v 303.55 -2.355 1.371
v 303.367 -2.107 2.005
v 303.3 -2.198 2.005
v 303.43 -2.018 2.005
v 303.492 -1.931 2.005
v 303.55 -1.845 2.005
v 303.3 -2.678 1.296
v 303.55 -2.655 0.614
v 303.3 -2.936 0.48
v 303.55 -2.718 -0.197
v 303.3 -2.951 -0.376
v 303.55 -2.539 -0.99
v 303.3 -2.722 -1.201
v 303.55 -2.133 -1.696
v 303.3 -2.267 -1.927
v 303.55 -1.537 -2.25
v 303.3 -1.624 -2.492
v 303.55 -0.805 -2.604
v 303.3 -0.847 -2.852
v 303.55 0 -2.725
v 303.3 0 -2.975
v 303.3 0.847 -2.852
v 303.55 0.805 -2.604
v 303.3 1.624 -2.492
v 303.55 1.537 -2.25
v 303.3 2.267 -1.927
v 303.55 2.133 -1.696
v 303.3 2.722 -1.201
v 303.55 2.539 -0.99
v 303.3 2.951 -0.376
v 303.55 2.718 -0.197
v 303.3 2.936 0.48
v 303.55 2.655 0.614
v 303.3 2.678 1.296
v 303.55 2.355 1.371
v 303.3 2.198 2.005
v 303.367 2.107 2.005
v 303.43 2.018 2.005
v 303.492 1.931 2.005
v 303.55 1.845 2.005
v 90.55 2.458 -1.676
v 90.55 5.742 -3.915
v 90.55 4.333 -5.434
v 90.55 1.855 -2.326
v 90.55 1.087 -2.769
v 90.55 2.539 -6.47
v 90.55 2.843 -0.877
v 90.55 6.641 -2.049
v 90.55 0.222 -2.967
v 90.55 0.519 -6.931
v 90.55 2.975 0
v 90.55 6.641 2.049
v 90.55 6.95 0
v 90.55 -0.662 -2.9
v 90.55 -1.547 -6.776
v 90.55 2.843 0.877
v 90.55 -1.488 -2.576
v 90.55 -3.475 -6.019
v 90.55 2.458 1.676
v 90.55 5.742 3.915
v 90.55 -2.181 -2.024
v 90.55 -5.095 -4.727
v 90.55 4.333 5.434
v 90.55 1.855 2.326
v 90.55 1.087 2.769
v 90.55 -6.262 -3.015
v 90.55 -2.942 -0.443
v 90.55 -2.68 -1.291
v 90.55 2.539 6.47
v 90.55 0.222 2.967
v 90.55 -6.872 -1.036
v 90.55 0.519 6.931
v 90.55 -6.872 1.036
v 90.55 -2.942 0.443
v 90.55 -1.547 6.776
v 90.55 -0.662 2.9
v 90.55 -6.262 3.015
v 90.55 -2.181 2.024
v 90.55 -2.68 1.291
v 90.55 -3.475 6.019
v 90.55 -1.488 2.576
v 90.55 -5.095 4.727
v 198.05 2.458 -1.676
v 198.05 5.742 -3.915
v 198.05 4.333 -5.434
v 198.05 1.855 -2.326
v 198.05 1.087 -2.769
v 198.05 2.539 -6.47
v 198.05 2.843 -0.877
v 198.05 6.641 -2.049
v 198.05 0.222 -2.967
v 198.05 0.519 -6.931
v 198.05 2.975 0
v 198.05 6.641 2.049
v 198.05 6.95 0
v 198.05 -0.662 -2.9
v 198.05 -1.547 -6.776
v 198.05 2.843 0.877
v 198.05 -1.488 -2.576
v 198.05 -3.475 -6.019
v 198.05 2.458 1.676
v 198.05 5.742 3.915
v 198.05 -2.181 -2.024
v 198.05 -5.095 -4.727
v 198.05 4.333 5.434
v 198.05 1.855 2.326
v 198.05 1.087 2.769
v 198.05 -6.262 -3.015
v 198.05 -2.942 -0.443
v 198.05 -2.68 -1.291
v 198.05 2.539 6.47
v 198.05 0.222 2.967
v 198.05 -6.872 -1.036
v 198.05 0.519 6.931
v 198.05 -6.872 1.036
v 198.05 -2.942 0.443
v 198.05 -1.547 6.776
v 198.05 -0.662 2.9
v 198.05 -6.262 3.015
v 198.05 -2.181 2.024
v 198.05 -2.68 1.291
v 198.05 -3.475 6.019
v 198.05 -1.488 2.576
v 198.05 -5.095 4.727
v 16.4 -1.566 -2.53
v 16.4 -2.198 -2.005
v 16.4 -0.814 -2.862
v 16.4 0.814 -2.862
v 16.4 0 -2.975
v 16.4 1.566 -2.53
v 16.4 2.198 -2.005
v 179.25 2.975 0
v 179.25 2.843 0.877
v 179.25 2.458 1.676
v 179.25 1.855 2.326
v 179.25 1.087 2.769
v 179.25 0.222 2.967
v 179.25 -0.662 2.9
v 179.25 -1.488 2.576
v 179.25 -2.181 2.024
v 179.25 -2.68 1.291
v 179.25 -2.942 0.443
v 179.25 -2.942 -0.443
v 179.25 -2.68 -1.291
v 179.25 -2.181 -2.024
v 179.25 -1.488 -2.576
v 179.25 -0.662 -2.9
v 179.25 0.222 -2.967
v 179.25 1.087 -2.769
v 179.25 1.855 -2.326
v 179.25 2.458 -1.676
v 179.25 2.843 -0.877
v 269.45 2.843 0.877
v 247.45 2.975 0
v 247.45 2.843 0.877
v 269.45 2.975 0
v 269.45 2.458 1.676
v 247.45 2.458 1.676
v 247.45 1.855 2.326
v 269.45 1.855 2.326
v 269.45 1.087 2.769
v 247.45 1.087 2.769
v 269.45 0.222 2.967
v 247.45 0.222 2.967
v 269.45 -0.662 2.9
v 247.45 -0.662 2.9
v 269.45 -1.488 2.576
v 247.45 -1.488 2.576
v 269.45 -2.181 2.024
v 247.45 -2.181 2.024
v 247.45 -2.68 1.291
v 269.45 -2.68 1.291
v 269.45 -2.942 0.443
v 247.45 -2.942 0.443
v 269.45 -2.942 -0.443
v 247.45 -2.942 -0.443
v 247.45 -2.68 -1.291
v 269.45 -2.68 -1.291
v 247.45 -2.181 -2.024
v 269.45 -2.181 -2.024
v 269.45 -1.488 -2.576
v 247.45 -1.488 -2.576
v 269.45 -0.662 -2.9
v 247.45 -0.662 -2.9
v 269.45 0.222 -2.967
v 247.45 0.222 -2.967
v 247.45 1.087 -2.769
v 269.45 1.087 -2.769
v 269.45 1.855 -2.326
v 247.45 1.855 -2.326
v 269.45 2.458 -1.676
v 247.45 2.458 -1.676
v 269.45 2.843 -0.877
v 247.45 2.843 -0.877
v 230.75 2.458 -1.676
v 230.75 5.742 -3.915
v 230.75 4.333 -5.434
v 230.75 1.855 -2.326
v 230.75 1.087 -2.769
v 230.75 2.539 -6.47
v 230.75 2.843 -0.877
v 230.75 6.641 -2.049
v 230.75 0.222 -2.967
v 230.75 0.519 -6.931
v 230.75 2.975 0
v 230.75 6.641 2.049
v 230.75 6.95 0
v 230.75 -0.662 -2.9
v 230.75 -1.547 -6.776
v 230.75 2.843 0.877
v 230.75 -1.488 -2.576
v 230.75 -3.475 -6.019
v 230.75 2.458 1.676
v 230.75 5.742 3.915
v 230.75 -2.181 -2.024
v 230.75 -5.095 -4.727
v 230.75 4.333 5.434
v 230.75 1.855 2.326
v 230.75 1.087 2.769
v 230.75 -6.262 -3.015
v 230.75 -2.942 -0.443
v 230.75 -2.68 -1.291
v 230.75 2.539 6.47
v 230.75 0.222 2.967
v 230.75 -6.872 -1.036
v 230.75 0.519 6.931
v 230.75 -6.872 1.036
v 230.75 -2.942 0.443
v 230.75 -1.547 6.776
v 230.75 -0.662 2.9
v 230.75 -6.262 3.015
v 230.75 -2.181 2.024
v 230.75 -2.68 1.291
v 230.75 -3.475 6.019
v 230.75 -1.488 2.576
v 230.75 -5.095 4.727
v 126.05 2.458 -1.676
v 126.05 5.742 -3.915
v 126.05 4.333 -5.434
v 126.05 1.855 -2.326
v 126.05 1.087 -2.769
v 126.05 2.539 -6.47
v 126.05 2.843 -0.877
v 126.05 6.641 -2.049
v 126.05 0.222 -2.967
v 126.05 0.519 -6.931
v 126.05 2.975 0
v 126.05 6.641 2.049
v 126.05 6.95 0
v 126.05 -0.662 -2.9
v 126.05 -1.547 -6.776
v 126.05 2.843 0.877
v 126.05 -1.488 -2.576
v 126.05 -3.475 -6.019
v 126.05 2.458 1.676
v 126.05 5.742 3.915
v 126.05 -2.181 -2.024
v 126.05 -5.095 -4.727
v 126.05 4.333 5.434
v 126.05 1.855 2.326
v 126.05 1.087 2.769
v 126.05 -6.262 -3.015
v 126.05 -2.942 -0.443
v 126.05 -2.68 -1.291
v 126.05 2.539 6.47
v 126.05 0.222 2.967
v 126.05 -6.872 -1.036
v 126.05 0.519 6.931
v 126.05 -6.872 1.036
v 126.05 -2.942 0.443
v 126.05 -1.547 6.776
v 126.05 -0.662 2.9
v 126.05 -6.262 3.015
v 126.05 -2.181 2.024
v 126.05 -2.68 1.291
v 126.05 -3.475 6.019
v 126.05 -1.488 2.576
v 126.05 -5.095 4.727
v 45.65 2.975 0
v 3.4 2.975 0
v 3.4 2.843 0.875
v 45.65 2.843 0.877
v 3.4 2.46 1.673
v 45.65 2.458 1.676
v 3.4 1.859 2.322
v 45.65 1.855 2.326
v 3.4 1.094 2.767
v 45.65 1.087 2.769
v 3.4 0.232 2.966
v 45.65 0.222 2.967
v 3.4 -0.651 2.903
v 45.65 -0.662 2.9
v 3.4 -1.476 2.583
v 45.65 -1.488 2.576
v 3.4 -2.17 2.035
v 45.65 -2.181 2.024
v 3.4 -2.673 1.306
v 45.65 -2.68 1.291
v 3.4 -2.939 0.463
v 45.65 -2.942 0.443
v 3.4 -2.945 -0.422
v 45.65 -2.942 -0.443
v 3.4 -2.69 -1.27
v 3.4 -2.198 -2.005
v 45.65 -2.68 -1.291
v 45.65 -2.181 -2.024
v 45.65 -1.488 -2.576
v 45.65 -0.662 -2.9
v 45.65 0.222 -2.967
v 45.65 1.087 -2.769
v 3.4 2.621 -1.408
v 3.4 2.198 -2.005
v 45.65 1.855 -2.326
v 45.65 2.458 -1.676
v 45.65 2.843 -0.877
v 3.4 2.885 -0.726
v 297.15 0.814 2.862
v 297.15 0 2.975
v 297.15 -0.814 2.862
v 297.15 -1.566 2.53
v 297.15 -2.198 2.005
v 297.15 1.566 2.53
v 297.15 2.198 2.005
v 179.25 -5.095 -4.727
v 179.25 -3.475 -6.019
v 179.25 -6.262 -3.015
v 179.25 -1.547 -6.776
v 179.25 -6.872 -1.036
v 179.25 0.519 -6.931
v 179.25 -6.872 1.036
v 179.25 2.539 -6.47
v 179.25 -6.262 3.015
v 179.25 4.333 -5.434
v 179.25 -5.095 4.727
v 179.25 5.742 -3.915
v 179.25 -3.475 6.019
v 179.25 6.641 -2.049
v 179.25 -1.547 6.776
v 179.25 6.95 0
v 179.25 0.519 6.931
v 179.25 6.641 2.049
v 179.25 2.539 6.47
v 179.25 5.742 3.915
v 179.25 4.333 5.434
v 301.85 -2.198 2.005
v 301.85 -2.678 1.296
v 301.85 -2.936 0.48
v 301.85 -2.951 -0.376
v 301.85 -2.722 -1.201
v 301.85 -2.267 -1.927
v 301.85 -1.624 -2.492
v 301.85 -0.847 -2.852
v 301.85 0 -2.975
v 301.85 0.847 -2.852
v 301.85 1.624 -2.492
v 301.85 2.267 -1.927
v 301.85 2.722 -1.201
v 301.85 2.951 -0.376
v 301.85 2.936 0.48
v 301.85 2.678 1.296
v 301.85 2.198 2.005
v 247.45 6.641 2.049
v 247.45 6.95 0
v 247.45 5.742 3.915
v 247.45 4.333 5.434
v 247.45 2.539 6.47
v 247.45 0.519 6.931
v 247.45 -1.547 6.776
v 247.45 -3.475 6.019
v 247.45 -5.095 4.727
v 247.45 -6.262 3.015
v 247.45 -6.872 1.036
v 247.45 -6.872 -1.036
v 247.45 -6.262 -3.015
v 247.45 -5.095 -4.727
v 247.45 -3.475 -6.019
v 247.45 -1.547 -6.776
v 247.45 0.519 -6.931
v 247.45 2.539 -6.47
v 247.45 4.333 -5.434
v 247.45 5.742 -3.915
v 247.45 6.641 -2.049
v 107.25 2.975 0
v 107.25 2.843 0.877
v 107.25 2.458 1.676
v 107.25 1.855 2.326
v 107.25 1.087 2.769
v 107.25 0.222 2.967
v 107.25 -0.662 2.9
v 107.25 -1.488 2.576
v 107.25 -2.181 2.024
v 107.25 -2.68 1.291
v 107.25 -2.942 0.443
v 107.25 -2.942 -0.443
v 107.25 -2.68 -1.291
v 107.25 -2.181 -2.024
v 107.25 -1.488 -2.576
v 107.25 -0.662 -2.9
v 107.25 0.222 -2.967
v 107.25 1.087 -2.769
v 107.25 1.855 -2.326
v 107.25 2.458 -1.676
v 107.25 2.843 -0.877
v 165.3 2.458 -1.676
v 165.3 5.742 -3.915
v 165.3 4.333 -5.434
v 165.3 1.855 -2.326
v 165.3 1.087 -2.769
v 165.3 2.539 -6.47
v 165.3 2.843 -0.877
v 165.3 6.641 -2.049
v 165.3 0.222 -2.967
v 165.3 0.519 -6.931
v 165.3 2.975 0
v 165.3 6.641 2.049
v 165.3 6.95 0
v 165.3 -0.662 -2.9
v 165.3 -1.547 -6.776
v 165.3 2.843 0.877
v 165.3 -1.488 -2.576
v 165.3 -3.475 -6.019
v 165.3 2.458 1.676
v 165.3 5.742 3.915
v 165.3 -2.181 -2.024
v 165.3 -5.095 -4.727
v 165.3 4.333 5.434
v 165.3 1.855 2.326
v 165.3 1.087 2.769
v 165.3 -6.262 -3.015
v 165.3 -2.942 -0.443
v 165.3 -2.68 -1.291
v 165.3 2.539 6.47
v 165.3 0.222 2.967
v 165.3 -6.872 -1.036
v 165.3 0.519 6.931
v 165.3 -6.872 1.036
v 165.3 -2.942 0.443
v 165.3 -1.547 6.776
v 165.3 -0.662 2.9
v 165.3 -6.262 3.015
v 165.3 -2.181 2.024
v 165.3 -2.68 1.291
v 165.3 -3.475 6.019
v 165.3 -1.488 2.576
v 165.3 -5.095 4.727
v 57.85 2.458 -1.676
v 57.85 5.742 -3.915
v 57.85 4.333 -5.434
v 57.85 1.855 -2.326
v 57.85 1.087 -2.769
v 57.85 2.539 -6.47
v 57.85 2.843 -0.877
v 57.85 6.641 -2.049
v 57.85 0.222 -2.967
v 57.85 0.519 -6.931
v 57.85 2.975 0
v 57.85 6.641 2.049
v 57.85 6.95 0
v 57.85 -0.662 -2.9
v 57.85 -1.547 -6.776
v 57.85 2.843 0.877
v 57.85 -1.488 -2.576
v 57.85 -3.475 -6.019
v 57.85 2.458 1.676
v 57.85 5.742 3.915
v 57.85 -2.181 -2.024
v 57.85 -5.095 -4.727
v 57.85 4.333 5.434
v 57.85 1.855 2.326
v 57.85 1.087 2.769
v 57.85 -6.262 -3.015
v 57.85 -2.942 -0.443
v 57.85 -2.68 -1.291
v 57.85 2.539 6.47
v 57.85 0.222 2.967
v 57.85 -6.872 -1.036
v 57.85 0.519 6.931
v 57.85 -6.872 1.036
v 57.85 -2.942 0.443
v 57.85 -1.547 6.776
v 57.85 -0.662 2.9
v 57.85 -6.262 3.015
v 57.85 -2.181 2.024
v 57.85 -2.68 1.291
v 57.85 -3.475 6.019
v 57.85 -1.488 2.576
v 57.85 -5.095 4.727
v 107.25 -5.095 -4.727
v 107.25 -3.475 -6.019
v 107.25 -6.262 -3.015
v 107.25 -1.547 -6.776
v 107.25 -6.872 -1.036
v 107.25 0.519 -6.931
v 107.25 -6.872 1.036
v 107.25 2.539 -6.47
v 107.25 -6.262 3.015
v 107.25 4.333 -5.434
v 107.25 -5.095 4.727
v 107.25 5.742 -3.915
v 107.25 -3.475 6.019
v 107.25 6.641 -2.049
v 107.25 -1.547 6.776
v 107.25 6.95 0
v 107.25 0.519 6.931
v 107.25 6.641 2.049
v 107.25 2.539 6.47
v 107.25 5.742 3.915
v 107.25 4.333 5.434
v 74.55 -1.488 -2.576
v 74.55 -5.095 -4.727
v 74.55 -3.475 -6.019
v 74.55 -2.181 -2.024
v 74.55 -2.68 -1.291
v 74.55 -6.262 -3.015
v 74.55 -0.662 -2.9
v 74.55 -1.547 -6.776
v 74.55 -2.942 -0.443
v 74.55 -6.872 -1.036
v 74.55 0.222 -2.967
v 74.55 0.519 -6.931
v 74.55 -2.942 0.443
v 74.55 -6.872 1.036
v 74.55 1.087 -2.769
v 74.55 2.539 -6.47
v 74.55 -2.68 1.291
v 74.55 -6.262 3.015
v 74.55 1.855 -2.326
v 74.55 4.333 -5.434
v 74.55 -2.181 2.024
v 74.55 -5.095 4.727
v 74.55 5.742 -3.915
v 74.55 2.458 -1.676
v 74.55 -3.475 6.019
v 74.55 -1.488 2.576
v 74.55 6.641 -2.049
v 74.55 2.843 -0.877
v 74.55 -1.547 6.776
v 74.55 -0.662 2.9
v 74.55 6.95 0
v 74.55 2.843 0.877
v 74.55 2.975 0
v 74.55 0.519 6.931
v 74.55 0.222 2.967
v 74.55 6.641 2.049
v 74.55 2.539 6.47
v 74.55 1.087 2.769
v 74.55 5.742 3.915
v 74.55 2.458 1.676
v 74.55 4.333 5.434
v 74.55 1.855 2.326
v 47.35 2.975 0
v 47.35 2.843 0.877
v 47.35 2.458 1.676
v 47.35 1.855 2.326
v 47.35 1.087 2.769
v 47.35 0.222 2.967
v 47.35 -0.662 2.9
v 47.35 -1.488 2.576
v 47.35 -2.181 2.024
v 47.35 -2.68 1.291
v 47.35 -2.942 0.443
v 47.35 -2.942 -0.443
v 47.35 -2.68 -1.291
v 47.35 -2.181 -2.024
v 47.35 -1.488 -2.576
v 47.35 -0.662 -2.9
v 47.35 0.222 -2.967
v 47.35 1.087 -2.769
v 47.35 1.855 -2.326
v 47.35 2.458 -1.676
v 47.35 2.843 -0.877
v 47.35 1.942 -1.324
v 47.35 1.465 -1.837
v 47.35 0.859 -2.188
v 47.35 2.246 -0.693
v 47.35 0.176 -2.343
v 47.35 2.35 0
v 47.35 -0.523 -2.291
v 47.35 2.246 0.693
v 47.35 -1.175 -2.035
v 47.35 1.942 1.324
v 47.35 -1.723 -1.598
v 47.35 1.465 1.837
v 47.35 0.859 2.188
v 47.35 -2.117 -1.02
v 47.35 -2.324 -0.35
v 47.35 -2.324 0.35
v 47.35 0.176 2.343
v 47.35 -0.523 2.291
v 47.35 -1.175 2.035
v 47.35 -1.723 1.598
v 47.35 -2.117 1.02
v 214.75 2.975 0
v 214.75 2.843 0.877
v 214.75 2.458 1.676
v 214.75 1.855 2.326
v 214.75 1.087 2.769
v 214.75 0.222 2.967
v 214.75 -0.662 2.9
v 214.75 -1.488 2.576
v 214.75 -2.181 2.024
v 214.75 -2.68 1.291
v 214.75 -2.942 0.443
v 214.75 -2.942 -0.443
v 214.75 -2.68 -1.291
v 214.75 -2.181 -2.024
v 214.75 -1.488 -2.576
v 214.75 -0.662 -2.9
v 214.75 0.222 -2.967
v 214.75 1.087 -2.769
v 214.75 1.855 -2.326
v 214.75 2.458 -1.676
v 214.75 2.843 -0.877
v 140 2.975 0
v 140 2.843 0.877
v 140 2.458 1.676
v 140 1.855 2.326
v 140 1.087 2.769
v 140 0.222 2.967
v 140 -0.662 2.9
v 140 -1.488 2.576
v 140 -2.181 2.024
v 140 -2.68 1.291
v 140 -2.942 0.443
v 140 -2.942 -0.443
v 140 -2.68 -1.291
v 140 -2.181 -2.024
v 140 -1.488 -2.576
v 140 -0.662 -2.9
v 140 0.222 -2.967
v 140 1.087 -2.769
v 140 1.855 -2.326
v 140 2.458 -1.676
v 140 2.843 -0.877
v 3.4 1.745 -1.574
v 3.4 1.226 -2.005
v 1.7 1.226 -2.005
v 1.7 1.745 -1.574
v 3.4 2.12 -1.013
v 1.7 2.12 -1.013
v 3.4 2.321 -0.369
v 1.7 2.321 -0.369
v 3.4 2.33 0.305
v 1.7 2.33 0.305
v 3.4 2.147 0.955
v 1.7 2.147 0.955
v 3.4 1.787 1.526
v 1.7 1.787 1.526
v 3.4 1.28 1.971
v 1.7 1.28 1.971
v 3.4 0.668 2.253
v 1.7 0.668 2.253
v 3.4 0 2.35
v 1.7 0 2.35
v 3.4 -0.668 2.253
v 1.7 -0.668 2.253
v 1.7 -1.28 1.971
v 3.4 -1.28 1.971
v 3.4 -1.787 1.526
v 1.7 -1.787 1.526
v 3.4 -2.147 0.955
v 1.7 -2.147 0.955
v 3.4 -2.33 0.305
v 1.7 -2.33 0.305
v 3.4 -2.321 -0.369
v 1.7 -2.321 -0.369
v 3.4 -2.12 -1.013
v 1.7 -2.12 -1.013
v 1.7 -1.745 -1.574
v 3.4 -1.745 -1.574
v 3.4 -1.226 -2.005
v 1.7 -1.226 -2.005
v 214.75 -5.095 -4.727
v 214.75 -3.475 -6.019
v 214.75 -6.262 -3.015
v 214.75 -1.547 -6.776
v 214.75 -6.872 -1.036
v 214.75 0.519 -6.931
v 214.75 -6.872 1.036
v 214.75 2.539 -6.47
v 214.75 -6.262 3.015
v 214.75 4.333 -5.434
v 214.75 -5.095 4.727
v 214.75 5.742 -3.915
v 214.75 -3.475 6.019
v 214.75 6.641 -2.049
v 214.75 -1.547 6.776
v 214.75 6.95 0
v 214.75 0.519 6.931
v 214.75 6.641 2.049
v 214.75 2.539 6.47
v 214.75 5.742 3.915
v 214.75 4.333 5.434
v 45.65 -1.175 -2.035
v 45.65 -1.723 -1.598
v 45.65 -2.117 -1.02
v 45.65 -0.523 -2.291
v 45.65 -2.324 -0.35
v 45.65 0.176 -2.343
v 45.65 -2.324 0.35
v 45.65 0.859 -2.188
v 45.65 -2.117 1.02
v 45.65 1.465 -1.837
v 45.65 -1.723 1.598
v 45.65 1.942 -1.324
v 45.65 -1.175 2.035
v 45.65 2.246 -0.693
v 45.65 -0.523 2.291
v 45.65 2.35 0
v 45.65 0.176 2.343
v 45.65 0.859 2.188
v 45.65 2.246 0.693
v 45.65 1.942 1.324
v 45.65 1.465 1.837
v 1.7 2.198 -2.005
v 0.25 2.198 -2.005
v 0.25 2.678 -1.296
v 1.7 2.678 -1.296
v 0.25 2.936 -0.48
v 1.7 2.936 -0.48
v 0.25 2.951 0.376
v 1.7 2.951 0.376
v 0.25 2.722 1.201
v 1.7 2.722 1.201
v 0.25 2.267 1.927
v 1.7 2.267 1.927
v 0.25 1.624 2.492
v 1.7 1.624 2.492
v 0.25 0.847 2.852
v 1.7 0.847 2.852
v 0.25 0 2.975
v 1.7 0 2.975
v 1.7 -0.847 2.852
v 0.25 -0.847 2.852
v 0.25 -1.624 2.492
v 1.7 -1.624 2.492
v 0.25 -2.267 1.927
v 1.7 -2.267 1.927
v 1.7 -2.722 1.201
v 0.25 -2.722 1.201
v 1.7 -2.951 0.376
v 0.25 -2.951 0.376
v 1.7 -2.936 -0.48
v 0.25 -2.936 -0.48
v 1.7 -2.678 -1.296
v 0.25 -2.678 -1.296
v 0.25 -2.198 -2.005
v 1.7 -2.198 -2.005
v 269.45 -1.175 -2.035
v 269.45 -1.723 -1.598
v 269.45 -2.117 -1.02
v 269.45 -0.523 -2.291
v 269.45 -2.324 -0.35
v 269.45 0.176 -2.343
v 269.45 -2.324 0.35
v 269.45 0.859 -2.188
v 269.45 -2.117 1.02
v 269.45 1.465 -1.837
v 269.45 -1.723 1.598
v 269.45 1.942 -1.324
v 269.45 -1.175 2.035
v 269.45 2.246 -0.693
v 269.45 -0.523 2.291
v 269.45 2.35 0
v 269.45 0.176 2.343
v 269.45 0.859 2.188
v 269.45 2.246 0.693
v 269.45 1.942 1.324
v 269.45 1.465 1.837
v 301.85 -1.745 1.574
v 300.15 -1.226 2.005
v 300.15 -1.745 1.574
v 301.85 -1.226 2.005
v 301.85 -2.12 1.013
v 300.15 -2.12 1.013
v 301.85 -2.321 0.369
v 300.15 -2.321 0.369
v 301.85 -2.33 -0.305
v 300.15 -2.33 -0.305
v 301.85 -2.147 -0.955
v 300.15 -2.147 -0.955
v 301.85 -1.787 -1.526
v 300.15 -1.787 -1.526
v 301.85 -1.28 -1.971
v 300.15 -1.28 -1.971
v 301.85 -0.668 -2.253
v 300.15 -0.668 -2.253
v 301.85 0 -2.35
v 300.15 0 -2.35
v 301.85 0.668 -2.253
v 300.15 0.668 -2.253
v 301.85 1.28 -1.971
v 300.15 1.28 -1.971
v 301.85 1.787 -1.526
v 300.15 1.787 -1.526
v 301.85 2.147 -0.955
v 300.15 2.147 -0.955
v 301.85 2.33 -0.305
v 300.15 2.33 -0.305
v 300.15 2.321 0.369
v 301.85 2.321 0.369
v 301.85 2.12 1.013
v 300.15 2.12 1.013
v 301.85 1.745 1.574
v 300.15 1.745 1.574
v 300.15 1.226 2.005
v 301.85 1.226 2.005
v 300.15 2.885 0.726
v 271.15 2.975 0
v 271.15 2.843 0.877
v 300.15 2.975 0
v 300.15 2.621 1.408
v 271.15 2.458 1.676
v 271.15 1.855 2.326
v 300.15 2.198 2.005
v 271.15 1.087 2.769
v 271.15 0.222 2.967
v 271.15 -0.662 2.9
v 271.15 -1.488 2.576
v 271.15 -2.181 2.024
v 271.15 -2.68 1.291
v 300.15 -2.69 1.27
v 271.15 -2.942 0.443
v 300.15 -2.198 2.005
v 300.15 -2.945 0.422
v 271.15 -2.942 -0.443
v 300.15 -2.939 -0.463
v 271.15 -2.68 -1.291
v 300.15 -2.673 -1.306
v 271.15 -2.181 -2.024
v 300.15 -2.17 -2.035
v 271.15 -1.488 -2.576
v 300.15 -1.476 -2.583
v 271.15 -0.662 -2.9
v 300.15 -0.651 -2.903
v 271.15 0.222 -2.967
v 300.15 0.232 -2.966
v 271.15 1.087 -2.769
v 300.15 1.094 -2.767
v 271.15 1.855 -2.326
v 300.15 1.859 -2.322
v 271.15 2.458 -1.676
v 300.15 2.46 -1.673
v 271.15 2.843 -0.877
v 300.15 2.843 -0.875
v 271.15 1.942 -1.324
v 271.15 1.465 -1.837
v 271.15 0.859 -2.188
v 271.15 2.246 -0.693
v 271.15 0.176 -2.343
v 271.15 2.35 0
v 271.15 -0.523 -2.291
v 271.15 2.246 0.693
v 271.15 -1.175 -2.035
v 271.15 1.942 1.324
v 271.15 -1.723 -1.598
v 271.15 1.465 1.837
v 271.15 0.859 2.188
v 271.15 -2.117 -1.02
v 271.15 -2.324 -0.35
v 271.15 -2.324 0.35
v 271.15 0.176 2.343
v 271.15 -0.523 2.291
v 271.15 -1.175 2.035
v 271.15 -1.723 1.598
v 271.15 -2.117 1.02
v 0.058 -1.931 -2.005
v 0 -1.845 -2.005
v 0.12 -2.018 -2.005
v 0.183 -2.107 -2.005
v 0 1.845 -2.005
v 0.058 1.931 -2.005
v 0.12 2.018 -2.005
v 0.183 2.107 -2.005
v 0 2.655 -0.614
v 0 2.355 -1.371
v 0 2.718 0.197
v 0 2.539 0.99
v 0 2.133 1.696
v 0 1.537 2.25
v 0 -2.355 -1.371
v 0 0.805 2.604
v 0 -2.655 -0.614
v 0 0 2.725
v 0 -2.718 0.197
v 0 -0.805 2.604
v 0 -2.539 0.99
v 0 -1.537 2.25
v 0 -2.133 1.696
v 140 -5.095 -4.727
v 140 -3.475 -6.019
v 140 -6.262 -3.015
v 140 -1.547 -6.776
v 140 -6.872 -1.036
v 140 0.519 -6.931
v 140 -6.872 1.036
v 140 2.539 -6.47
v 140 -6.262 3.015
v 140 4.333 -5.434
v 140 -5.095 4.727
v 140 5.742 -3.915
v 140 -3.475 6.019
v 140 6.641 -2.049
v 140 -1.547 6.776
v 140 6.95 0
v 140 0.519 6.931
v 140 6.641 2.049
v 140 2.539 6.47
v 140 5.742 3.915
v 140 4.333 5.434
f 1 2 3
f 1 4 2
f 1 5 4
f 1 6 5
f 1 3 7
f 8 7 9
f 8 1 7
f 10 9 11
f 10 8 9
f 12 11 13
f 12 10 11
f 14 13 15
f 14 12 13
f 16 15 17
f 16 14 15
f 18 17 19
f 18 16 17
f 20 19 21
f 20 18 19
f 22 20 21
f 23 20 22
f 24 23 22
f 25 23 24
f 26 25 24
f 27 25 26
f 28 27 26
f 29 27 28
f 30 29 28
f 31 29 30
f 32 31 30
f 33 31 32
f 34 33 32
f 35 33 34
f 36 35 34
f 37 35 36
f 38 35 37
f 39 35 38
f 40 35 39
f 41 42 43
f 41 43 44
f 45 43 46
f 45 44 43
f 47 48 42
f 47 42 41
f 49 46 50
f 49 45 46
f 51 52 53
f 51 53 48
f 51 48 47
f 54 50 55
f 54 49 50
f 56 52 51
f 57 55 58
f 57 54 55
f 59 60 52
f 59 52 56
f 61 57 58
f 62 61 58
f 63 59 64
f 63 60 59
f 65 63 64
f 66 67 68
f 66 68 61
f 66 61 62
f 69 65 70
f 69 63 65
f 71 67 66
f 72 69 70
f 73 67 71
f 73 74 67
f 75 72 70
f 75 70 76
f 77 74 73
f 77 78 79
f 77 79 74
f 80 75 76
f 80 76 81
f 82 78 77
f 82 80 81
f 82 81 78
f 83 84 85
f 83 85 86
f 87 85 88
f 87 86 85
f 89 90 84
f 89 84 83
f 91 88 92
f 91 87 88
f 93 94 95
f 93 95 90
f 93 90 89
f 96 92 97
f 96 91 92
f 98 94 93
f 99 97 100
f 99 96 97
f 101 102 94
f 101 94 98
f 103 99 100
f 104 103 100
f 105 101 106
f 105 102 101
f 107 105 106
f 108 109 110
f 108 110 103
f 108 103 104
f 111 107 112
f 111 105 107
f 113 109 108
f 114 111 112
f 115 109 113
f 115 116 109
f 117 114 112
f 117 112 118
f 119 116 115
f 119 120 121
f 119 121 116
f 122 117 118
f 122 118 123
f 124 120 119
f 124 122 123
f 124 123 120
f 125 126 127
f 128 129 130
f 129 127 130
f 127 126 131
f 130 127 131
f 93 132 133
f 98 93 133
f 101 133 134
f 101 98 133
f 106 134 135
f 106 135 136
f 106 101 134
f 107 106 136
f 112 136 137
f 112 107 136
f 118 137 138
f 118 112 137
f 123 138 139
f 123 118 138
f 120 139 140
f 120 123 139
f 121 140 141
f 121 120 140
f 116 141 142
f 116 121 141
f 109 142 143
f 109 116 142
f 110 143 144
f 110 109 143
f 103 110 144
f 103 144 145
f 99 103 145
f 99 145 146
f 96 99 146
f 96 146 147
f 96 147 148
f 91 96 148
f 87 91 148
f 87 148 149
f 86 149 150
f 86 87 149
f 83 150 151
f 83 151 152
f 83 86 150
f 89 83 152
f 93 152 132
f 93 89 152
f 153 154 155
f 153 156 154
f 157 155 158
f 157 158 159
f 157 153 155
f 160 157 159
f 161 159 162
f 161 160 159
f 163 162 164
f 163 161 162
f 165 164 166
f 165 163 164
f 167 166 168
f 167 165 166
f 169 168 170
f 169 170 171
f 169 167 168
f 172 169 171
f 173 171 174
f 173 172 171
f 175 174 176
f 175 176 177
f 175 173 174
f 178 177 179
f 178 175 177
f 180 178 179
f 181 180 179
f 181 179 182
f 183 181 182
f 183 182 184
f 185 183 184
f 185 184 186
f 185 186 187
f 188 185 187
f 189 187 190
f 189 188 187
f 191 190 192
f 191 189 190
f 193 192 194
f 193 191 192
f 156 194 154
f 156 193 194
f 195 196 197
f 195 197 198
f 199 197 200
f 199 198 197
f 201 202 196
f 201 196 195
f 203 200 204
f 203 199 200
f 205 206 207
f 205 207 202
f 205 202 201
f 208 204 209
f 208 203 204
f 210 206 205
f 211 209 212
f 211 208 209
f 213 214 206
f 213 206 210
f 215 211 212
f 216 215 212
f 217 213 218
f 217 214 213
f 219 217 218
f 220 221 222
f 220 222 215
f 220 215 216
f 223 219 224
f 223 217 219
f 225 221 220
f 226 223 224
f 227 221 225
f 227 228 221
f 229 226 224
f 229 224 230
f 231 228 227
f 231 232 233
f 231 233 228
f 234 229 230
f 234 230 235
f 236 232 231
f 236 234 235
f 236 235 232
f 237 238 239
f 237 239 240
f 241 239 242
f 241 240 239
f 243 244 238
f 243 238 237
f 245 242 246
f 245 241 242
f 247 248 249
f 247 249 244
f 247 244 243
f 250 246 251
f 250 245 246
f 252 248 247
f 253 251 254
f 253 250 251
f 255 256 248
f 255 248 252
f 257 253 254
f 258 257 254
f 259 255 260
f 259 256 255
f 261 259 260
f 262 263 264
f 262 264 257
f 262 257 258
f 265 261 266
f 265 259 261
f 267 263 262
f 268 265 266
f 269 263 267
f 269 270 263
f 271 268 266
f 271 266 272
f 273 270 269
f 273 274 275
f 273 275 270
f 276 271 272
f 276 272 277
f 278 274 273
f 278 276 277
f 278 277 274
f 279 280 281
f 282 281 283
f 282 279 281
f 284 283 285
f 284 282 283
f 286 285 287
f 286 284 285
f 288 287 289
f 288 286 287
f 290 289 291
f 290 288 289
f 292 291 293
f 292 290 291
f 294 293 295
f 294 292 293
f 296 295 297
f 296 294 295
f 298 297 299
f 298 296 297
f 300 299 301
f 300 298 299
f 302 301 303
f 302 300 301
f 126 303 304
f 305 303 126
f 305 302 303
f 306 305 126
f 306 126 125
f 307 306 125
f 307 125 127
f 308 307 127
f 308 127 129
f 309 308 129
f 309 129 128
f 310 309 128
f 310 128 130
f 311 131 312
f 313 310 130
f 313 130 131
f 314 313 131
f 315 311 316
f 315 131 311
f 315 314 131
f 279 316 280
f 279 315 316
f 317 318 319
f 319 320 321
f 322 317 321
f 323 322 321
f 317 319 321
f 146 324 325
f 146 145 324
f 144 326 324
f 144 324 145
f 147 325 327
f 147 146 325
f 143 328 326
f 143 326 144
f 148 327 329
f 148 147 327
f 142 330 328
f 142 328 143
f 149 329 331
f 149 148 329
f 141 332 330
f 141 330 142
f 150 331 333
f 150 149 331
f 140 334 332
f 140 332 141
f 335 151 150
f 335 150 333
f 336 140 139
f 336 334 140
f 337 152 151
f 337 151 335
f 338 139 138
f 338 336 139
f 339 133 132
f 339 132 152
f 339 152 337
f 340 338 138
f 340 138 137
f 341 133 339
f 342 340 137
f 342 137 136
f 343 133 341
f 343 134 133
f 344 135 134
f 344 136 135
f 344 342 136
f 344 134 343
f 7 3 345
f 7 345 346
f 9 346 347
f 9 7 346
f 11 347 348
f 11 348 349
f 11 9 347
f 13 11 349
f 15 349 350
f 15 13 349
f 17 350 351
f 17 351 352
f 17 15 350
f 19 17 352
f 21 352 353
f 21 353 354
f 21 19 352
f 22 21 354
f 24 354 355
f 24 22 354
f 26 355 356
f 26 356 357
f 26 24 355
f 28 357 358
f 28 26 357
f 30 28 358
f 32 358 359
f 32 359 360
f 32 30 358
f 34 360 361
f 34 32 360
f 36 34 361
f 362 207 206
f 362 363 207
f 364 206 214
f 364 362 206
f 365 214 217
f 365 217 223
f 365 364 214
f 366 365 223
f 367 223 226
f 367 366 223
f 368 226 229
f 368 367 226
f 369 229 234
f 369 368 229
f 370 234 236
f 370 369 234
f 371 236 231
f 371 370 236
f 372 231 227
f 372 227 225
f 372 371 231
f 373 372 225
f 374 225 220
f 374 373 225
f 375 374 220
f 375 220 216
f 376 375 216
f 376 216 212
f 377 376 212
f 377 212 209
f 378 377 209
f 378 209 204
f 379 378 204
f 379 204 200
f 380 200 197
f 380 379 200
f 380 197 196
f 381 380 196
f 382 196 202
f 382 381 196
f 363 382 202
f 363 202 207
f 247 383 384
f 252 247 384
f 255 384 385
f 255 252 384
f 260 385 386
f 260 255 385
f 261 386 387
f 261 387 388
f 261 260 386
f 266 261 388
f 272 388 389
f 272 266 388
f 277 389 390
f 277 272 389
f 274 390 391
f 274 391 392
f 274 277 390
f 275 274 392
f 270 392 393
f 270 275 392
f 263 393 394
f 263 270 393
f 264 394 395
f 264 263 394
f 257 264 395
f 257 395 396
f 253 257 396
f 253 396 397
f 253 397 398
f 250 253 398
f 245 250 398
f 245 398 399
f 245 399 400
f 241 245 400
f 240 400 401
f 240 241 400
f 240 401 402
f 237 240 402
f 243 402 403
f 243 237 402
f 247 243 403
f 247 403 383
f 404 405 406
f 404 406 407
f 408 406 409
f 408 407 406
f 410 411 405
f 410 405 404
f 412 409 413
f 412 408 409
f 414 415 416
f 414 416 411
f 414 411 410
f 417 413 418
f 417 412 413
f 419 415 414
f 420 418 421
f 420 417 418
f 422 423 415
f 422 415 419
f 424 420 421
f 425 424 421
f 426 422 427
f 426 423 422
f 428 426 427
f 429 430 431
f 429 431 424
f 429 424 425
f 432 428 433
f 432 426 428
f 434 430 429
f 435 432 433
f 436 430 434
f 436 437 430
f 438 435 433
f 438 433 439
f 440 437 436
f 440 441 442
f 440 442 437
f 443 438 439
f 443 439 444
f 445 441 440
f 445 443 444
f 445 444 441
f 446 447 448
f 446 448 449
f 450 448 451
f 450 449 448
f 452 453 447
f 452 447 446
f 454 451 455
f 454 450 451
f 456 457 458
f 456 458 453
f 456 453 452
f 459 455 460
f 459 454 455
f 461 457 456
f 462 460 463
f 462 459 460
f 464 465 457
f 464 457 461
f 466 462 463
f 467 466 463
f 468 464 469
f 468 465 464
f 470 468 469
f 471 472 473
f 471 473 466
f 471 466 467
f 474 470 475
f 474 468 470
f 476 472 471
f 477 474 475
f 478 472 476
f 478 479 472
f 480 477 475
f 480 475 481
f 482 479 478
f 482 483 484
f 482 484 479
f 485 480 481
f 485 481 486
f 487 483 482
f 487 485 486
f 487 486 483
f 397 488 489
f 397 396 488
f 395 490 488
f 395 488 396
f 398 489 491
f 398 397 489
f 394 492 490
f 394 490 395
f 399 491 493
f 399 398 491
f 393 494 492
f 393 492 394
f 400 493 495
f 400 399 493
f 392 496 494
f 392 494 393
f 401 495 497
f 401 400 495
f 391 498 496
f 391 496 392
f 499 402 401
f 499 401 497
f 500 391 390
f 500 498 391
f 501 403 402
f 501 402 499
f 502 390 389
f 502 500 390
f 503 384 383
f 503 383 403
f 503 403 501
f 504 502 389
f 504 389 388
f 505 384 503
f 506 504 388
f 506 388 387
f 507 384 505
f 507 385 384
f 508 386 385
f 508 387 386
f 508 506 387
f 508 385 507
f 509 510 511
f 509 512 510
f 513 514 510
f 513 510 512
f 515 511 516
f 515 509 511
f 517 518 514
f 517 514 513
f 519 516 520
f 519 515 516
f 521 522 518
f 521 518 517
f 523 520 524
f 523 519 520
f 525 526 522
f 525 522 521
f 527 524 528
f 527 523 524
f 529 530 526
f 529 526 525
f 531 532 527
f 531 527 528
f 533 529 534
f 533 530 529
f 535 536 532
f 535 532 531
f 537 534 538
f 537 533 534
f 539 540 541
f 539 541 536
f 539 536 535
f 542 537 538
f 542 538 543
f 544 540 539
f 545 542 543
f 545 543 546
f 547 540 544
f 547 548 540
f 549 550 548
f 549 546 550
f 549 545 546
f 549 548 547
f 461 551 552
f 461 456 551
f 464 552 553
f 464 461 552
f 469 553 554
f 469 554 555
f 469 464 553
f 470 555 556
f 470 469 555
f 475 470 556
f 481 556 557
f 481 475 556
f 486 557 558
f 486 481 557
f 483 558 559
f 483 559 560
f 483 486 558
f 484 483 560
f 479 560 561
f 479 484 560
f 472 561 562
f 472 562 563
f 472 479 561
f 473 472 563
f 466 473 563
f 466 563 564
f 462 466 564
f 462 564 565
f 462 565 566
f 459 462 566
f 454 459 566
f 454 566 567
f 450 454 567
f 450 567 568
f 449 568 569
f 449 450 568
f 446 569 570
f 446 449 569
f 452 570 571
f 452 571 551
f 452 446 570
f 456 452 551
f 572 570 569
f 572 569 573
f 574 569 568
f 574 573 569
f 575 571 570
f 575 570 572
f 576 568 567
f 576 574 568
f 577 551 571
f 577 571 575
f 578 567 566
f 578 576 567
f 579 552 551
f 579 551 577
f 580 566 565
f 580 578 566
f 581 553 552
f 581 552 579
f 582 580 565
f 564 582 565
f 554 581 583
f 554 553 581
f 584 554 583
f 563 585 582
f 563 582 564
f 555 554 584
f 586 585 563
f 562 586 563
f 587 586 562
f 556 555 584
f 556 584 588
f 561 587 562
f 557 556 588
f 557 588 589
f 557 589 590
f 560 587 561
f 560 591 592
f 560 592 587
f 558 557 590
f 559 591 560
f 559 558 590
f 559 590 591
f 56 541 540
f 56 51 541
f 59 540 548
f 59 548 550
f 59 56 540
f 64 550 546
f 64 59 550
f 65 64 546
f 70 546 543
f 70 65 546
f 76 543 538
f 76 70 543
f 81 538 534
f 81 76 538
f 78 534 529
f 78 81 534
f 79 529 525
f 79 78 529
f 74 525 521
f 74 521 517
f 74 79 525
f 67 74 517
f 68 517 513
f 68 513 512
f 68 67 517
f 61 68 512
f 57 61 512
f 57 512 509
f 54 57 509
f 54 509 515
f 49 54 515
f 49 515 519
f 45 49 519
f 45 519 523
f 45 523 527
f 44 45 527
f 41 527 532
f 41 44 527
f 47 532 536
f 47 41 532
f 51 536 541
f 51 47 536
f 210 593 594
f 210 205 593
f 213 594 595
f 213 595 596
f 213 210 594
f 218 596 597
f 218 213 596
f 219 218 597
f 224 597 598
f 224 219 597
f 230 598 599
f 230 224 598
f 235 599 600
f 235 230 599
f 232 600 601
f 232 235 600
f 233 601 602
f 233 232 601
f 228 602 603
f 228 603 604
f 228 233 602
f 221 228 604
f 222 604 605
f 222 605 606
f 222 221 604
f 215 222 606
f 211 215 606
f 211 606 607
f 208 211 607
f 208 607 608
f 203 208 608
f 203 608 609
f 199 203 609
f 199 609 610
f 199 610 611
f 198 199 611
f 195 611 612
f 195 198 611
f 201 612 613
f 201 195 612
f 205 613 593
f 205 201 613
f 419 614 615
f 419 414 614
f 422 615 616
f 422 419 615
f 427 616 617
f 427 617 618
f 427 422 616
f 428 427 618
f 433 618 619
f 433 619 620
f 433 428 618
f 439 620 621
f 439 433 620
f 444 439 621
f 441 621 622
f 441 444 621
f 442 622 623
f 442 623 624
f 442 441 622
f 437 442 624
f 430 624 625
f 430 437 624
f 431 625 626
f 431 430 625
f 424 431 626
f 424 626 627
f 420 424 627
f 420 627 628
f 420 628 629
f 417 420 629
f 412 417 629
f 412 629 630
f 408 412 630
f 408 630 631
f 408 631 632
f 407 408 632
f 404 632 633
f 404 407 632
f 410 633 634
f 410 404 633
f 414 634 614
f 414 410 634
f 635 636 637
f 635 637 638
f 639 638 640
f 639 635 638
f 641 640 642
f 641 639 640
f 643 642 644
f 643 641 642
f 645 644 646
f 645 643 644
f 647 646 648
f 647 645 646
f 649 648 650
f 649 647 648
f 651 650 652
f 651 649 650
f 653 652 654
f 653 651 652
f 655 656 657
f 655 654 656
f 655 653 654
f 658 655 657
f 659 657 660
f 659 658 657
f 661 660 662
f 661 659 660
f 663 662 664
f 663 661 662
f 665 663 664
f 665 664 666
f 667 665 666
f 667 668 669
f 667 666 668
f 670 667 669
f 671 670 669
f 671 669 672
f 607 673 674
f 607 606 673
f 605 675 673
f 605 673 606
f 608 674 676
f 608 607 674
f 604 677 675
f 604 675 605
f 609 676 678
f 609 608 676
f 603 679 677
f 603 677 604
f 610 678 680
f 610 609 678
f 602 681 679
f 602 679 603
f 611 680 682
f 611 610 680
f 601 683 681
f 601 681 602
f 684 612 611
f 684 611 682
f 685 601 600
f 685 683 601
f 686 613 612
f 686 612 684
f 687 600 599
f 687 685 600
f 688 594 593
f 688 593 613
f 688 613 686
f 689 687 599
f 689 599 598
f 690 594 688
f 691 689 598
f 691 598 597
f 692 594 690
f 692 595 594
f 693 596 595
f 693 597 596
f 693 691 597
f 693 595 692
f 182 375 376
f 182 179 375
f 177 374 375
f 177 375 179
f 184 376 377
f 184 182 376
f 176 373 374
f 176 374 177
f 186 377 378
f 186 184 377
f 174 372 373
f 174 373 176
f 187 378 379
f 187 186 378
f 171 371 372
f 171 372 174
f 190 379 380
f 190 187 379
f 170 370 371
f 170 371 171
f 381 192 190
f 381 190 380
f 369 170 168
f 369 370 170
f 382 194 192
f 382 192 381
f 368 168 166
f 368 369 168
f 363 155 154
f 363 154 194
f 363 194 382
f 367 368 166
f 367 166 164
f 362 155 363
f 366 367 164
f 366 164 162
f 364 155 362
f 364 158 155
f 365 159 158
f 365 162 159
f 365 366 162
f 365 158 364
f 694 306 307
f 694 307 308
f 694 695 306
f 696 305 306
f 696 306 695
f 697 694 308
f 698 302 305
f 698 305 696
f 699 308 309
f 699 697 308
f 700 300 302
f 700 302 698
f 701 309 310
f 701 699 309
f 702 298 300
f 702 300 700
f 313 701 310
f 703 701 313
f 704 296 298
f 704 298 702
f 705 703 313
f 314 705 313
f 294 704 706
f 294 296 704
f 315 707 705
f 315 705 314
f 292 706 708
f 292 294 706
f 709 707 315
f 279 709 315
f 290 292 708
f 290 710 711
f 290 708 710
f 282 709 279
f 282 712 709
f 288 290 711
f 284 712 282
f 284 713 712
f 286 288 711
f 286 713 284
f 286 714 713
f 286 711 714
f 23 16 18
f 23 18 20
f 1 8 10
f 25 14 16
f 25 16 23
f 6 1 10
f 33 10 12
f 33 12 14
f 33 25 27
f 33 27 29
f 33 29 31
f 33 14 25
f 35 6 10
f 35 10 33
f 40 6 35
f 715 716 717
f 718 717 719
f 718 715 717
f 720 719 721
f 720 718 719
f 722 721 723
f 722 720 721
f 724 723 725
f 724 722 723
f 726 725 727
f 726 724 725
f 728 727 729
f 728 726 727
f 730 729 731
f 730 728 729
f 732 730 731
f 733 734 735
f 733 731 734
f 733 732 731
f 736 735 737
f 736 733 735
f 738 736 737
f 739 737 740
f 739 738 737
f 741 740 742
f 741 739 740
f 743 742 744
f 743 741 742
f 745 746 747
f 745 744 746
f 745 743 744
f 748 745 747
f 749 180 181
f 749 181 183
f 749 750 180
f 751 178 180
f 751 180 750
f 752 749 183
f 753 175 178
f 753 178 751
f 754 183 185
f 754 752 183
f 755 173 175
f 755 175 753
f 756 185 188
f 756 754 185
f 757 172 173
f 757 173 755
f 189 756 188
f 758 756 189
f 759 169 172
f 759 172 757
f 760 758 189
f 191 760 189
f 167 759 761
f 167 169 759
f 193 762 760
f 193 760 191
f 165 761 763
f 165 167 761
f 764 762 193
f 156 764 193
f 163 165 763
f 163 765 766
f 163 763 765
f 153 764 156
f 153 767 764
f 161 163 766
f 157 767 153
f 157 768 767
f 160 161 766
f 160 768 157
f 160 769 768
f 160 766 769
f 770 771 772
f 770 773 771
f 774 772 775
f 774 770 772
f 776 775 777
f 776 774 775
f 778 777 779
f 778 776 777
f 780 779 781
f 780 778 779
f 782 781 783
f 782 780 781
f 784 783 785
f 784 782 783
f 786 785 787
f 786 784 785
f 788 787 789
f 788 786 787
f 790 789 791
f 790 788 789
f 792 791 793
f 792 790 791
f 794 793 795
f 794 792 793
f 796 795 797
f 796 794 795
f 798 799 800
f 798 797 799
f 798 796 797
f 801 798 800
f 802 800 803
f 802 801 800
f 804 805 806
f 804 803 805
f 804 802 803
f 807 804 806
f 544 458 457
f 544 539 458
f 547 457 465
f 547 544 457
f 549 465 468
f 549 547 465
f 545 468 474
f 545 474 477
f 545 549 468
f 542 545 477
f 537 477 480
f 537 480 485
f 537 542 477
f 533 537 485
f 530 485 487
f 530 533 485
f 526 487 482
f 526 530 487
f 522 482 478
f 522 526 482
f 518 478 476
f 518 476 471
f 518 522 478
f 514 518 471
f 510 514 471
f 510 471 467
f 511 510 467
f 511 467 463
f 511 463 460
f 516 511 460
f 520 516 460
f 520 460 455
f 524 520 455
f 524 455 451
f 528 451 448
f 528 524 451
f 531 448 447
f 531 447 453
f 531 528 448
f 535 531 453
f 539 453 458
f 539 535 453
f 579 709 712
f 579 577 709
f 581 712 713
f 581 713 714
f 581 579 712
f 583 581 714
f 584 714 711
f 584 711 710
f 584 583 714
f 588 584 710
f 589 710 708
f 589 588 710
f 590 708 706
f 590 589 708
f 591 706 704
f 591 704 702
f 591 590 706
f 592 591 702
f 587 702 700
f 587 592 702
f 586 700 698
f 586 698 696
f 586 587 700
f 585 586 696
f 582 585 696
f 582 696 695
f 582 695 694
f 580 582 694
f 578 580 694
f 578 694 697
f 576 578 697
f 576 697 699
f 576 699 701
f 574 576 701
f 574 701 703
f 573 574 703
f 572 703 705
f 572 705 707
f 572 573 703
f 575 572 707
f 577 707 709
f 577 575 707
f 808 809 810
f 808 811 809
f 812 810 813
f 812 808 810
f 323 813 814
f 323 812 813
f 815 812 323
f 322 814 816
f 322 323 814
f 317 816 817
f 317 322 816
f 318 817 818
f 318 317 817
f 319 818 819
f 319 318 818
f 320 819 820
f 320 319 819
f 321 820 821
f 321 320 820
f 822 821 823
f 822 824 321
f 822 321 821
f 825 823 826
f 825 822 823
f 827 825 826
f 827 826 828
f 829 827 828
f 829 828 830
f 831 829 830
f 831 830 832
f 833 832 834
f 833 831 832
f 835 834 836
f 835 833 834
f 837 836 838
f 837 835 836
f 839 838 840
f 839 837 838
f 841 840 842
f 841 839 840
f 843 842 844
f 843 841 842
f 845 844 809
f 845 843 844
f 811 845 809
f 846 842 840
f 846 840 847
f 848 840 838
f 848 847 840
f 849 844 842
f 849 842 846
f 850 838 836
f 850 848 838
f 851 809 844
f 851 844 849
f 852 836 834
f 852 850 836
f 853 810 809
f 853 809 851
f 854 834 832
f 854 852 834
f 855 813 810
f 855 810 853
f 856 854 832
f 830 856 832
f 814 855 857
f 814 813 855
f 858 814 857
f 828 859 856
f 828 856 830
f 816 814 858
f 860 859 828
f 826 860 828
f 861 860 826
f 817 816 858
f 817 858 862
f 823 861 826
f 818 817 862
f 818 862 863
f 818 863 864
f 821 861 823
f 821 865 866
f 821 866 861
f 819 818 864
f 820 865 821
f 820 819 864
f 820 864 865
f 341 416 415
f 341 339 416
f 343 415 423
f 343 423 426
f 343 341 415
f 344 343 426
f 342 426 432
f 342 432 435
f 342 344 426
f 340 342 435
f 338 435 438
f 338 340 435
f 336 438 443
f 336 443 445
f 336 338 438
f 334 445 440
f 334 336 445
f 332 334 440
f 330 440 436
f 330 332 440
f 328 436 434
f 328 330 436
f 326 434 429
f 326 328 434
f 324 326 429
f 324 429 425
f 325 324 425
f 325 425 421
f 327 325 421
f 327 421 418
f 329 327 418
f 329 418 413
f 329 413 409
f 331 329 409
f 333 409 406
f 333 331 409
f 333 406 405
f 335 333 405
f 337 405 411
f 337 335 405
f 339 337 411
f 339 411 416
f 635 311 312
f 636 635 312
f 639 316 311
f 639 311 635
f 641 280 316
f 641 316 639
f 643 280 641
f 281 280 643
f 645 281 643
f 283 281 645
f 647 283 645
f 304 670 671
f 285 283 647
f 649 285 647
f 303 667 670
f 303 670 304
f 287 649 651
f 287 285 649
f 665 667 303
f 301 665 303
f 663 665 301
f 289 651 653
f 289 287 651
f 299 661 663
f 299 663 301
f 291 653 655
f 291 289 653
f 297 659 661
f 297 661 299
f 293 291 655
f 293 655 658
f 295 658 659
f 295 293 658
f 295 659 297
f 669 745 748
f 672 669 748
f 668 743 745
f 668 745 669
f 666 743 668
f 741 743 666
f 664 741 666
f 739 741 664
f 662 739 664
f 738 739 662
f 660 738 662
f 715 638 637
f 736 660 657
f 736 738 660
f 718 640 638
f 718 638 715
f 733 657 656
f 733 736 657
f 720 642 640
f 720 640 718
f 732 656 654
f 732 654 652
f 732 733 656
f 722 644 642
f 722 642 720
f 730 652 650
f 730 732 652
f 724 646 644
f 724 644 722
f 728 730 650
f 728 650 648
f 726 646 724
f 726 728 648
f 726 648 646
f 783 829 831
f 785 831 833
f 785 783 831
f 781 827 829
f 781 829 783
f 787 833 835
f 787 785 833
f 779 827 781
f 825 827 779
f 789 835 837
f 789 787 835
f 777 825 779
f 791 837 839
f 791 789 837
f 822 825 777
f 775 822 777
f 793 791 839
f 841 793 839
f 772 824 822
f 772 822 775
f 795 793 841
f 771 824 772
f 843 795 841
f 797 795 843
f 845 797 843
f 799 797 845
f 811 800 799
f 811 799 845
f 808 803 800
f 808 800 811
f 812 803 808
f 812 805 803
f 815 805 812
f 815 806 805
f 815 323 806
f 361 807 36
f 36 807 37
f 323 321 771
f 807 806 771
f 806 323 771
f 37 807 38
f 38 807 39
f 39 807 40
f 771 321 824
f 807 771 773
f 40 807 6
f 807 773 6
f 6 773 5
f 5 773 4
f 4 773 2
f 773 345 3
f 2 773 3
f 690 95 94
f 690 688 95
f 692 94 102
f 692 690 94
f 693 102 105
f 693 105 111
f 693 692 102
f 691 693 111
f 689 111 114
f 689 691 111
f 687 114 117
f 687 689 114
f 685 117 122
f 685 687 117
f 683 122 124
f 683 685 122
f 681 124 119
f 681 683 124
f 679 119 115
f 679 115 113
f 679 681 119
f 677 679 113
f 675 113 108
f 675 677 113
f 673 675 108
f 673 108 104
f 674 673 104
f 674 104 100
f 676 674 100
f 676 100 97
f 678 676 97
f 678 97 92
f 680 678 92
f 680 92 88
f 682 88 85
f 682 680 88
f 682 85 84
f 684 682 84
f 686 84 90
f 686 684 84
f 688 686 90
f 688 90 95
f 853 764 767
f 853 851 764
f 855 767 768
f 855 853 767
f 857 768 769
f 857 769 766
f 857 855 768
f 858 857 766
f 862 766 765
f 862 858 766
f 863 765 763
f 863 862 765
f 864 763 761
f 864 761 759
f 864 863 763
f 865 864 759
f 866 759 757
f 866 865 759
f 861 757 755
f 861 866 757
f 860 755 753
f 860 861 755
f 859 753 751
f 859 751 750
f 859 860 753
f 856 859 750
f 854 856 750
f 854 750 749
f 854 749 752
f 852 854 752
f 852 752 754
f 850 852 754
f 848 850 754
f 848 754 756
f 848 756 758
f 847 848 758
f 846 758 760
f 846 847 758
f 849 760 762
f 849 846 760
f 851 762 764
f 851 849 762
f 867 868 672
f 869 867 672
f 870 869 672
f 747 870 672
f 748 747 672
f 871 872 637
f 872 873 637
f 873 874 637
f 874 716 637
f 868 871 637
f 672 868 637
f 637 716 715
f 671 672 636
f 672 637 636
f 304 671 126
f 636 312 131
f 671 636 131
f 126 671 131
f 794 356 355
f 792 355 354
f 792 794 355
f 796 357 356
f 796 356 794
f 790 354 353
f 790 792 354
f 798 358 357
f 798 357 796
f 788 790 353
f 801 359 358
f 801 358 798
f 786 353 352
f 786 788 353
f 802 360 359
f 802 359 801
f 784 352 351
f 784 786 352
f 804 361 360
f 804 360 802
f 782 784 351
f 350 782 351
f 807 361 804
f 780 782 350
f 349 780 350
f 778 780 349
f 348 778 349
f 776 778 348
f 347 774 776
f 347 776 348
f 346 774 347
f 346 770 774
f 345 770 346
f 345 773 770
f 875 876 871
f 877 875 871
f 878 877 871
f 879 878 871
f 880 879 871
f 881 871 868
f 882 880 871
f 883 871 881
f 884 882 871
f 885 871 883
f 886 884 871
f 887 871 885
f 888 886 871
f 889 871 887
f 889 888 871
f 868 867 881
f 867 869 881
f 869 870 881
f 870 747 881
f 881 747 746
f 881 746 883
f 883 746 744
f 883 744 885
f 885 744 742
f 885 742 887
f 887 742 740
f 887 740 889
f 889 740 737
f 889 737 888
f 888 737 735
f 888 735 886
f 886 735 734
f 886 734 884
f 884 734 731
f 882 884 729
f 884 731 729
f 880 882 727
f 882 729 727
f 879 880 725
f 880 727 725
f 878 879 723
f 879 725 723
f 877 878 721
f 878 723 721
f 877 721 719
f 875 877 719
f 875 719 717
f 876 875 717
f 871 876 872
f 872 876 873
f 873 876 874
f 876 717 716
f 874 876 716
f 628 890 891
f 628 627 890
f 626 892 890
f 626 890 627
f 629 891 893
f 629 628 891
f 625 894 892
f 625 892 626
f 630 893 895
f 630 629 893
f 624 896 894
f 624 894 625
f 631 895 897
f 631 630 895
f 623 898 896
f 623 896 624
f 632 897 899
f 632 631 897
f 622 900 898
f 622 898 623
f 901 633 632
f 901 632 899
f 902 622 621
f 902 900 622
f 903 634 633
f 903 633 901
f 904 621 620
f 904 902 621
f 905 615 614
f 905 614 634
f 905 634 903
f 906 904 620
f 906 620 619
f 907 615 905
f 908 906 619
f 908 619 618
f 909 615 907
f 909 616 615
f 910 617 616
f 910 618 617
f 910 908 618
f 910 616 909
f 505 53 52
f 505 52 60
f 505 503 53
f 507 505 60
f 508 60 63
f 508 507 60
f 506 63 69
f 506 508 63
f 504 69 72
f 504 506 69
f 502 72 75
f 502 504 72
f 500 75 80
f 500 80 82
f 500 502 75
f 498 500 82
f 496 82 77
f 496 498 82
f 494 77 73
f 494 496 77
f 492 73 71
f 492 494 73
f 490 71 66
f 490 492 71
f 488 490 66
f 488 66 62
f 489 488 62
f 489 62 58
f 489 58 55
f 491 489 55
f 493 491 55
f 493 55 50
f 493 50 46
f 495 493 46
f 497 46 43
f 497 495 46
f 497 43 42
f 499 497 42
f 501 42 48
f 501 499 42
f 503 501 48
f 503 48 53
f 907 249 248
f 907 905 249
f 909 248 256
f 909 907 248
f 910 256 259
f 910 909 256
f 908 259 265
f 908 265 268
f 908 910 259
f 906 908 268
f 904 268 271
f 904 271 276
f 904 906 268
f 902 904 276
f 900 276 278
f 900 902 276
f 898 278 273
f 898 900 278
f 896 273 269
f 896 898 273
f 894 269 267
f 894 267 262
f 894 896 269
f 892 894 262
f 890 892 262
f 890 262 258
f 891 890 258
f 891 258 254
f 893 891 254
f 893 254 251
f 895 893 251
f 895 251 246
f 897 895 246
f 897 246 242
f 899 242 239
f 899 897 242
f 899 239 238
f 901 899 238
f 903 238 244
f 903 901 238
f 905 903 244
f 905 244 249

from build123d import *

# Parameters (mm, degrees)
ESQUISSE2_W                  = 16.4
ESQUISSE2_H                  = 2.788709481
ESQUISSE2_W_2                = 8.697698695
ESQUISSE2_H_2                = 2.899232898
ENL_V_MAT_EXTRU_1_DEPTH      = 7.95
ENL_V_MAT_EXTRU_1_DEPTH_BACK = 7.95
CHANFREIN1_SIZE              = 0.25


with BuildPart() as part:
    # Esquisse1 → Révolution1 (revolve)
    with BuildSketch(Plane.XY):
        Polygon((0, 0), (0, 2.975), (1.7, 2.975), (1.7, 2.35), (3.4, 2.35), (3.4, 2.975), (45.65, 2.975), (45.65, 2.35), (47.35, 2.35), (47.35, 2.975), (57.85, 2.975), (57.85, 6.95), (74.55, 6.95), (74.55, 2.975), (90.55, 2.975), (90.55, 6.95), (107.25, 6.95), (107.25, 2.975), (126.05, 2.975), (126.05, 6.95), (140, 6.95), (140, 2.975), (165.3, 2.975), (165.3, 6.95), (179.25, 6.95), (179.25, 2.975), (198.05, 2.975), (198.05, 6.95), (214.75, 6.95), (214.75, 2.975), (230.75, 2.975), (230.75, 6.95), (247.45, 6.95), (247.45, 2.975), (269.45, 2.975), (269.45, 2.35), (271.15, 2.35), (271.15, 2.975), (300.15, 2.975), (300.15, 2.35), (301.85, 2.35), (301.85, 2.975), (303.55, 2.975), (303.55, 0), align=None)
    revolve(axis=Axis((0, 0, 0), (1, 0, 0)))

    # Esquisse2 → Enlèv. mat.-Extru.1 (cut, two sides)
    with BuildSketch(Plane(origin=(0, 0, 0), x_dir=(1, 0, 0), z_dir=(0, 1, 0))) as enl_v_mat_extru_1_sk:
        with Locations((8.2, 3.399354741)):
            Rectangle(ESQUISSE2_W, ESQUISSE2_H)
        with Locations((301.498849348, -3.454616449)):
            Rectangle(ESQUISSE2_W_2, ESQUISSE2_H_2)
    extrude(amount=ENL_V_MAT_EXTRU_1_DEPTH, mode=Mode.SUBTRACT)
    extrude(enl_v_mat_extru_1_sk.sketch, amount=-ENL_V_MAT_EXTRU_1_DEPTH_BACK, mode=Mode.SUBTRACT)

    # Chanfrein1
    chanfrein1_edges = [part.edges().sort_by_distance(p)[0] for p in [
        (0, 0, 2.975),
        (303.55, 0, -2.975),
    ]]
    chamfer(chanfrein1_edges, length=CHANFREIN1_SIZE)


solid = part.part
